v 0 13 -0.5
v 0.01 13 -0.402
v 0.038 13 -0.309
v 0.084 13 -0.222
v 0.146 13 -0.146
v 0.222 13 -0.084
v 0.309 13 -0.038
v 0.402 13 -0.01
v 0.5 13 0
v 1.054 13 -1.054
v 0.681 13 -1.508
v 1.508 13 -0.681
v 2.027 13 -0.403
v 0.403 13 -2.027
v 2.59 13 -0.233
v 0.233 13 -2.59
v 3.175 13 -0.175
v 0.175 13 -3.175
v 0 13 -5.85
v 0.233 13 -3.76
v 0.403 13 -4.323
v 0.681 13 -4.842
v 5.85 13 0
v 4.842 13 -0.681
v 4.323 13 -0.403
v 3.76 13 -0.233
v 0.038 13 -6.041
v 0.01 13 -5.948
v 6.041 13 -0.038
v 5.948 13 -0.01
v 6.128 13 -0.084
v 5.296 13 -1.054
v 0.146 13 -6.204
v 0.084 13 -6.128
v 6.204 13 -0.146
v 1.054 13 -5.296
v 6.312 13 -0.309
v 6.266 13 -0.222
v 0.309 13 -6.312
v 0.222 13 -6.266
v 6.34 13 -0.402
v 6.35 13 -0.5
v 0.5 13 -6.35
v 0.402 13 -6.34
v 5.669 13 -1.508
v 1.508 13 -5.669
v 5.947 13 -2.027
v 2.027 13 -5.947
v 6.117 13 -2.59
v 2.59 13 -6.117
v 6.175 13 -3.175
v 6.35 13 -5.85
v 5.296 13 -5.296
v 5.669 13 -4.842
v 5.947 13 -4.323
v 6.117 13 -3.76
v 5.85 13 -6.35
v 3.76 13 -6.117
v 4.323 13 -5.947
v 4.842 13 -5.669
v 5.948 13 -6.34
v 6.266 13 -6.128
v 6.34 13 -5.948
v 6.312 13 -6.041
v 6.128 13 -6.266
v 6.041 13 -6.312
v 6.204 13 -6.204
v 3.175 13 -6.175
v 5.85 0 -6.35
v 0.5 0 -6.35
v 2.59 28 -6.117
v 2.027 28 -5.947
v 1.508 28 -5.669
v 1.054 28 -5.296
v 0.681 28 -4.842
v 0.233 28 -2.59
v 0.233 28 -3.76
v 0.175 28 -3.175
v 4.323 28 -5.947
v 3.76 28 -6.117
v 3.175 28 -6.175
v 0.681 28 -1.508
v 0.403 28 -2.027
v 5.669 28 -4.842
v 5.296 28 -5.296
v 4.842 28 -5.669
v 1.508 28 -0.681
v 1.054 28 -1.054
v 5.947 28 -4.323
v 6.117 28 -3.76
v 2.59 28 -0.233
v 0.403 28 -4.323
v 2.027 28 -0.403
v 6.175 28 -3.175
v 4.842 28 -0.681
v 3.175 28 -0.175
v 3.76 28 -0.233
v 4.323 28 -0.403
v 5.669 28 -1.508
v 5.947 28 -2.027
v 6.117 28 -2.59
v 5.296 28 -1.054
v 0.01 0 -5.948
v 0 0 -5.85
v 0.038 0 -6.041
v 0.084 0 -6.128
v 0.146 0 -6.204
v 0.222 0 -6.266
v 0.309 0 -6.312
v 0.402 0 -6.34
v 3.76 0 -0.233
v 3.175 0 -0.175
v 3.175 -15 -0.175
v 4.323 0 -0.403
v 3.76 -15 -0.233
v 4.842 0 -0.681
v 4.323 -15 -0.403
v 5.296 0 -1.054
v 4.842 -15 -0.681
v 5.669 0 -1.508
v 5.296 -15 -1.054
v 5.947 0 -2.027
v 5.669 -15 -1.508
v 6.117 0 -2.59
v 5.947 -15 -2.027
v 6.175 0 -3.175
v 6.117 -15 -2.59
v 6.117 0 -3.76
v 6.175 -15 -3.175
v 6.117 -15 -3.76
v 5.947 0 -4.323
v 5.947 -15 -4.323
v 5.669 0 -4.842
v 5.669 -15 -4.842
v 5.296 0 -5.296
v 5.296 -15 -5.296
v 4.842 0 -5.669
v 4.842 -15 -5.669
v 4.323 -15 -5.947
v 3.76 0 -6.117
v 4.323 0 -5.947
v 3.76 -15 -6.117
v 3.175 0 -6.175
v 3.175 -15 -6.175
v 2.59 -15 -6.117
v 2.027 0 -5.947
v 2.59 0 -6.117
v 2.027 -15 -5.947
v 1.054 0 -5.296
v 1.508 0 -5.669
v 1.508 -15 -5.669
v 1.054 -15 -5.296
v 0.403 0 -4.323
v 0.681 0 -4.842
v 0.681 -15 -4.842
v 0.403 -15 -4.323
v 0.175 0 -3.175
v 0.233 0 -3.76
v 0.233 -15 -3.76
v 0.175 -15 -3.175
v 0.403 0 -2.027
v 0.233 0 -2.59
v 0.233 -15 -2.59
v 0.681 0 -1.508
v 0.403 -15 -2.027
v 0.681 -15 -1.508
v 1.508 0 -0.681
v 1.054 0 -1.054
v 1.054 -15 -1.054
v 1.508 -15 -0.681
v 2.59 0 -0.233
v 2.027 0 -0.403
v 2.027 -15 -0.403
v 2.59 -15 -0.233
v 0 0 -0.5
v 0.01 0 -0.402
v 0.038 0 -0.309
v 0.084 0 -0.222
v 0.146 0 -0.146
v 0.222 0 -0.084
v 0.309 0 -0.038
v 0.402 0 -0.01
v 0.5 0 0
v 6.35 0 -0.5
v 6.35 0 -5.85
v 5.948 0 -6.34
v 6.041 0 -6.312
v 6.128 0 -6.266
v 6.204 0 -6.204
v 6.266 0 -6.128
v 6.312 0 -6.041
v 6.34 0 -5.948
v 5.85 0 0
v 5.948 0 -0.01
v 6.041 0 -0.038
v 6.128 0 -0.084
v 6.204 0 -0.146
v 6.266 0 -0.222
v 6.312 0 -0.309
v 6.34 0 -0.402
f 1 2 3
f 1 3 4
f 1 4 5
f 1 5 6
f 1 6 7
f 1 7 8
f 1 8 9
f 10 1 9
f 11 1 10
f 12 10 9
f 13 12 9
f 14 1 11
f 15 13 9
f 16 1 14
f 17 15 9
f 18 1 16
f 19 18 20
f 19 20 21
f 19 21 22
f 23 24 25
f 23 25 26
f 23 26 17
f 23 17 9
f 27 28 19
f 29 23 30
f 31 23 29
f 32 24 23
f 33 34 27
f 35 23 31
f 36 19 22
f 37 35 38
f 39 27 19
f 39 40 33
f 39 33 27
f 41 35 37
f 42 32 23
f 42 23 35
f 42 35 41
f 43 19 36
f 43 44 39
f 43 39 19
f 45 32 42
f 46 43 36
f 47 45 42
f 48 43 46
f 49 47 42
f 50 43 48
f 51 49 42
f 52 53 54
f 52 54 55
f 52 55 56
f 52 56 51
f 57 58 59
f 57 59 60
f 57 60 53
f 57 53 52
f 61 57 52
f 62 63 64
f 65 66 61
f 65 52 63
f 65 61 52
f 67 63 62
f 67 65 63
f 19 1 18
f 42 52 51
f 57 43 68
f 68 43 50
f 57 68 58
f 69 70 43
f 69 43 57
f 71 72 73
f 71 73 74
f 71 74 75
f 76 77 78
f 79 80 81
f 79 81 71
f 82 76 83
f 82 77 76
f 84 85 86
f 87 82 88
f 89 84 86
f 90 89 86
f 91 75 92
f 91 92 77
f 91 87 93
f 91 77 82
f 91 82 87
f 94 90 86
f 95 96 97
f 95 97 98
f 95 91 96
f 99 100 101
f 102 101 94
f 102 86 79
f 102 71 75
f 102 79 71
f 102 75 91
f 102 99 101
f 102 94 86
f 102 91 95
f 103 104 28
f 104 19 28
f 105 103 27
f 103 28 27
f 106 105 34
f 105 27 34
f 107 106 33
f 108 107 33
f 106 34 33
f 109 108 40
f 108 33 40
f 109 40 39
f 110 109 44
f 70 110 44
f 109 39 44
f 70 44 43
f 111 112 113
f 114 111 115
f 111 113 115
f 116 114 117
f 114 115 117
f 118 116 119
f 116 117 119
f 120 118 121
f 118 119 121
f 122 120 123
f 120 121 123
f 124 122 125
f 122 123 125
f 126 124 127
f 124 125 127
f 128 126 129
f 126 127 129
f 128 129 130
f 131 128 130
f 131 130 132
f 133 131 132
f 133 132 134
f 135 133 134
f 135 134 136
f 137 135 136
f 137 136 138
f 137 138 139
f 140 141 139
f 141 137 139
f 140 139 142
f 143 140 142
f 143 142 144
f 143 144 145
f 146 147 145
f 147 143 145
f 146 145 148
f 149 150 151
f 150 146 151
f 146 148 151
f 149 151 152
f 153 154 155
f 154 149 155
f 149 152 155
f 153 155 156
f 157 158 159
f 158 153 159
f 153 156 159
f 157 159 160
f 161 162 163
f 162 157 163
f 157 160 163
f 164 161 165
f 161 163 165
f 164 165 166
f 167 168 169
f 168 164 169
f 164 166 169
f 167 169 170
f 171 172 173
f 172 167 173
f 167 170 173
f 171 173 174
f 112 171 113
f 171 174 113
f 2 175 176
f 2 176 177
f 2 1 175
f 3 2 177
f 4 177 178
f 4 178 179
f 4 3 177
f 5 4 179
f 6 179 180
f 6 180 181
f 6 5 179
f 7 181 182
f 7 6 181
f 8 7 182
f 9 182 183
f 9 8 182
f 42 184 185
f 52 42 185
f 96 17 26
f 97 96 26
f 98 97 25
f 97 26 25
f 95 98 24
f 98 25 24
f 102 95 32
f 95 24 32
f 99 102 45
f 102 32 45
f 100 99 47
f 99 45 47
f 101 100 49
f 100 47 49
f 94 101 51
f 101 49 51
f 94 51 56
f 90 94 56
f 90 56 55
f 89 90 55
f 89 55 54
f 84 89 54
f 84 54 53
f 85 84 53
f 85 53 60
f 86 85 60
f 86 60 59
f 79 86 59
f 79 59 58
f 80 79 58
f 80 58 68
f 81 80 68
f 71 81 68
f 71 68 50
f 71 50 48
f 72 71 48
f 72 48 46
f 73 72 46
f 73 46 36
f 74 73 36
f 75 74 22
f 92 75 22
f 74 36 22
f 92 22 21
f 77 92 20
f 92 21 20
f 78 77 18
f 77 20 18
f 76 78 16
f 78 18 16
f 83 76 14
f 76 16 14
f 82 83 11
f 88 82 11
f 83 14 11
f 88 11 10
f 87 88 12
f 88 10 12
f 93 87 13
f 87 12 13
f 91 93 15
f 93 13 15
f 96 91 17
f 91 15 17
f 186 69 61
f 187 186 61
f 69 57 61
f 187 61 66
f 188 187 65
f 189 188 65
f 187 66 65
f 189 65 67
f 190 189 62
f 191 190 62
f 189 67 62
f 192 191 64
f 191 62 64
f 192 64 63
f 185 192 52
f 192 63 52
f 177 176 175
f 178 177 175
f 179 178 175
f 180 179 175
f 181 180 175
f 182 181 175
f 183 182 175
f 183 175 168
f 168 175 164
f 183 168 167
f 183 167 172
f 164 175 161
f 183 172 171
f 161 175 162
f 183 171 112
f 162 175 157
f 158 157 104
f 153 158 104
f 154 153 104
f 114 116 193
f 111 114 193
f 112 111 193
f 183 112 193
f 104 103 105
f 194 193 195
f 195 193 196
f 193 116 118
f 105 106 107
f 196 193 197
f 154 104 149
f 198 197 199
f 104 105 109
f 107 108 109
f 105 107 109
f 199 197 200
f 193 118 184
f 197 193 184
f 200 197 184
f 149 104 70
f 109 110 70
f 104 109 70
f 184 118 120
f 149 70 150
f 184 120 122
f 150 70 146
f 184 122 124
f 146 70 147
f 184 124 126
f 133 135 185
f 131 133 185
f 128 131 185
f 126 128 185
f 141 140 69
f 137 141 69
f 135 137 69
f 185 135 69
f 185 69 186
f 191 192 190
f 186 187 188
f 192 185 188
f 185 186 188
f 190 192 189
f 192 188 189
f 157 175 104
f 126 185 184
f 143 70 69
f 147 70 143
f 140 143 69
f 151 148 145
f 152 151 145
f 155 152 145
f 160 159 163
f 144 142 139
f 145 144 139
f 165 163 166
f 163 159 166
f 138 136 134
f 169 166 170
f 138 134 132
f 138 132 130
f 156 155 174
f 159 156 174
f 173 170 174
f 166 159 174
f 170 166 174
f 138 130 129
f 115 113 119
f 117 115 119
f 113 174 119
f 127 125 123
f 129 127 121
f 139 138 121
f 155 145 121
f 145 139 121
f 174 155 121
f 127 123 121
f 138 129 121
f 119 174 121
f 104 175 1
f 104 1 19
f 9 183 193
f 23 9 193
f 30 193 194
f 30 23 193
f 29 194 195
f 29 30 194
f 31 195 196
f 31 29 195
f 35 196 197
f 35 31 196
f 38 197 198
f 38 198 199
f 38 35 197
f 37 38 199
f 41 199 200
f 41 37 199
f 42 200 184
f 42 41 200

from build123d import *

# Parameters (mm, degrees)
ESQUISSE1_W             = 6.35
ESQUISSE1_H             = 6.35
BOSS_EXTRU_1_DEPTH      = 13
BOSS_EXTRU_2_DEPTH      = 15
BOSS_EXTRU_2_DEPTH_BACK = 28
ESQUISSE2_R             = 3
CONG_1_R                = 0.5


with BuildPart() as part:
    # Esquisse1 → Boss.-Extru.1 (new body)
    with BuildSketch(Plane(origin=(0, 0, 0), x_dir=(1, 0, 0), z_dir=(0, 1, 0))):
        with Locations((3.175, 3.175)):
            Rectangle(ESQUISSE1_W, ESQUISSE1_H)
    extrude(amount=BOSS_EXTRU_1_DEPTH)

    # Esquisse2 → Boss.-Extru.2 (add, two sides: drawn at the far end of the back side and taken through both)
    with BuildSketch(Plane(origin=(0, 13, 0), x_dir=(1, 0, 0), z_dir=(0, 1, 0)).offset(-BOSS_EXTRU_2_DEPTH_BACK)):
        with Locations(Location((3.175, 3.175, 0), (0, 0, 270))):
            Circle(ESQUISSE2_R)
    extrude(amount=BOSS_EXTRU_2_DEPTH + BOSS_EXTRU_2_DEPTH_BACK)

    # Congé1
    cong_1_edges = [part.edges().sort_by_distance(p)[0] for p in [
        (0, 6.5, -6.35),
        (6.35, 6.5, -6.35),
        (6.35, 6.5, 0),
        (0, 6.5, 0),
    ]]
    fillet(cong_1_edges, radius=CONG_1_R)


solid = part.part
